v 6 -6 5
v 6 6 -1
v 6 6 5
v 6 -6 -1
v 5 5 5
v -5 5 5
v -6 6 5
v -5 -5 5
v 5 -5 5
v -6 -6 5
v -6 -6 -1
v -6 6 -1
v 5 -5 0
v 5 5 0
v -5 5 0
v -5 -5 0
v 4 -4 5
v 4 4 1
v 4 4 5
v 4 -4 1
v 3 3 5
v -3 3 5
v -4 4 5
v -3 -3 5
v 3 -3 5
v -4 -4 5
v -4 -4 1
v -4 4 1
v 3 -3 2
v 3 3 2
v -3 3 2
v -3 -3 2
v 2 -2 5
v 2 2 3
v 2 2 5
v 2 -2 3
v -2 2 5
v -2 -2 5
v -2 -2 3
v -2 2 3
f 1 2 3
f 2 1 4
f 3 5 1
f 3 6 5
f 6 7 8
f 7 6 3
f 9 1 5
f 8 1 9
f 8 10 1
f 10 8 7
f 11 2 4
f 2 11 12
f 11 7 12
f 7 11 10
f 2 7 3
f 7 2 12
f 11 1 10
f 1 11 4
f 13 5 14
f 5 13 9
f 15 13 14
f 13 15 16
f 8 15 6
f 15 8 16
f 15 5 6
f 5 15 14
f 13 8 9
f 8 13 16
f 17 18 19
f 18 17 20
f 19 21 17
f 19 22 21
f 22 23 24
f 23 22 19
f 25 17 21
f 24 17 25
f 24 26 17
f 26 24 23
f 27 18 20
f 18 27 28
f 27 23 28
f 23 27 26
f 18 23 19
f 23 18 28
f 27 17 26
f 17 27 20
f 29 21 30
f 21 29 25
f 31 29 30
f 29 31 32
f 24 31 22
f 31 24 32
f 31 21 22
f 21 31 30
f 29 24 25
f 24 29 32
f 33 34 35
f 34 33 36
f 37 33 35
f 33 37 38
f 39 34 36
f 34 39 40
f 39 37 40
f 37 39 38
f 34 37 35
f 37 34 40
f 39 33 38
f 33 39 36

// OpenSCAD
union() {
	difference() {
		union() {
			difference() {
				union() {
					cube(size = [0, 0, 0]);
					translate(v = [-6.0, -6.0, -1]) {
						cube(size = [12, 12, 6.0]);
					}
				}
				translate(v = [-5.0, -5.0, 0]) {
					cube(size = [10, 10, 5.0]);
				}
			}
			translate(v = [-4.0, -4.0, 1]) {
				cube(size = [8, 8, 4.0]);
			}
		}
		translate(v = [-3.0, -3.0, 2]) {
			cube(size = [6, 6, 3.0]);
		}
	}
	translate(v = [-2.0, -2.0, 3]) {
		cube(size = [4, 4, 2.0]);
	}
}
